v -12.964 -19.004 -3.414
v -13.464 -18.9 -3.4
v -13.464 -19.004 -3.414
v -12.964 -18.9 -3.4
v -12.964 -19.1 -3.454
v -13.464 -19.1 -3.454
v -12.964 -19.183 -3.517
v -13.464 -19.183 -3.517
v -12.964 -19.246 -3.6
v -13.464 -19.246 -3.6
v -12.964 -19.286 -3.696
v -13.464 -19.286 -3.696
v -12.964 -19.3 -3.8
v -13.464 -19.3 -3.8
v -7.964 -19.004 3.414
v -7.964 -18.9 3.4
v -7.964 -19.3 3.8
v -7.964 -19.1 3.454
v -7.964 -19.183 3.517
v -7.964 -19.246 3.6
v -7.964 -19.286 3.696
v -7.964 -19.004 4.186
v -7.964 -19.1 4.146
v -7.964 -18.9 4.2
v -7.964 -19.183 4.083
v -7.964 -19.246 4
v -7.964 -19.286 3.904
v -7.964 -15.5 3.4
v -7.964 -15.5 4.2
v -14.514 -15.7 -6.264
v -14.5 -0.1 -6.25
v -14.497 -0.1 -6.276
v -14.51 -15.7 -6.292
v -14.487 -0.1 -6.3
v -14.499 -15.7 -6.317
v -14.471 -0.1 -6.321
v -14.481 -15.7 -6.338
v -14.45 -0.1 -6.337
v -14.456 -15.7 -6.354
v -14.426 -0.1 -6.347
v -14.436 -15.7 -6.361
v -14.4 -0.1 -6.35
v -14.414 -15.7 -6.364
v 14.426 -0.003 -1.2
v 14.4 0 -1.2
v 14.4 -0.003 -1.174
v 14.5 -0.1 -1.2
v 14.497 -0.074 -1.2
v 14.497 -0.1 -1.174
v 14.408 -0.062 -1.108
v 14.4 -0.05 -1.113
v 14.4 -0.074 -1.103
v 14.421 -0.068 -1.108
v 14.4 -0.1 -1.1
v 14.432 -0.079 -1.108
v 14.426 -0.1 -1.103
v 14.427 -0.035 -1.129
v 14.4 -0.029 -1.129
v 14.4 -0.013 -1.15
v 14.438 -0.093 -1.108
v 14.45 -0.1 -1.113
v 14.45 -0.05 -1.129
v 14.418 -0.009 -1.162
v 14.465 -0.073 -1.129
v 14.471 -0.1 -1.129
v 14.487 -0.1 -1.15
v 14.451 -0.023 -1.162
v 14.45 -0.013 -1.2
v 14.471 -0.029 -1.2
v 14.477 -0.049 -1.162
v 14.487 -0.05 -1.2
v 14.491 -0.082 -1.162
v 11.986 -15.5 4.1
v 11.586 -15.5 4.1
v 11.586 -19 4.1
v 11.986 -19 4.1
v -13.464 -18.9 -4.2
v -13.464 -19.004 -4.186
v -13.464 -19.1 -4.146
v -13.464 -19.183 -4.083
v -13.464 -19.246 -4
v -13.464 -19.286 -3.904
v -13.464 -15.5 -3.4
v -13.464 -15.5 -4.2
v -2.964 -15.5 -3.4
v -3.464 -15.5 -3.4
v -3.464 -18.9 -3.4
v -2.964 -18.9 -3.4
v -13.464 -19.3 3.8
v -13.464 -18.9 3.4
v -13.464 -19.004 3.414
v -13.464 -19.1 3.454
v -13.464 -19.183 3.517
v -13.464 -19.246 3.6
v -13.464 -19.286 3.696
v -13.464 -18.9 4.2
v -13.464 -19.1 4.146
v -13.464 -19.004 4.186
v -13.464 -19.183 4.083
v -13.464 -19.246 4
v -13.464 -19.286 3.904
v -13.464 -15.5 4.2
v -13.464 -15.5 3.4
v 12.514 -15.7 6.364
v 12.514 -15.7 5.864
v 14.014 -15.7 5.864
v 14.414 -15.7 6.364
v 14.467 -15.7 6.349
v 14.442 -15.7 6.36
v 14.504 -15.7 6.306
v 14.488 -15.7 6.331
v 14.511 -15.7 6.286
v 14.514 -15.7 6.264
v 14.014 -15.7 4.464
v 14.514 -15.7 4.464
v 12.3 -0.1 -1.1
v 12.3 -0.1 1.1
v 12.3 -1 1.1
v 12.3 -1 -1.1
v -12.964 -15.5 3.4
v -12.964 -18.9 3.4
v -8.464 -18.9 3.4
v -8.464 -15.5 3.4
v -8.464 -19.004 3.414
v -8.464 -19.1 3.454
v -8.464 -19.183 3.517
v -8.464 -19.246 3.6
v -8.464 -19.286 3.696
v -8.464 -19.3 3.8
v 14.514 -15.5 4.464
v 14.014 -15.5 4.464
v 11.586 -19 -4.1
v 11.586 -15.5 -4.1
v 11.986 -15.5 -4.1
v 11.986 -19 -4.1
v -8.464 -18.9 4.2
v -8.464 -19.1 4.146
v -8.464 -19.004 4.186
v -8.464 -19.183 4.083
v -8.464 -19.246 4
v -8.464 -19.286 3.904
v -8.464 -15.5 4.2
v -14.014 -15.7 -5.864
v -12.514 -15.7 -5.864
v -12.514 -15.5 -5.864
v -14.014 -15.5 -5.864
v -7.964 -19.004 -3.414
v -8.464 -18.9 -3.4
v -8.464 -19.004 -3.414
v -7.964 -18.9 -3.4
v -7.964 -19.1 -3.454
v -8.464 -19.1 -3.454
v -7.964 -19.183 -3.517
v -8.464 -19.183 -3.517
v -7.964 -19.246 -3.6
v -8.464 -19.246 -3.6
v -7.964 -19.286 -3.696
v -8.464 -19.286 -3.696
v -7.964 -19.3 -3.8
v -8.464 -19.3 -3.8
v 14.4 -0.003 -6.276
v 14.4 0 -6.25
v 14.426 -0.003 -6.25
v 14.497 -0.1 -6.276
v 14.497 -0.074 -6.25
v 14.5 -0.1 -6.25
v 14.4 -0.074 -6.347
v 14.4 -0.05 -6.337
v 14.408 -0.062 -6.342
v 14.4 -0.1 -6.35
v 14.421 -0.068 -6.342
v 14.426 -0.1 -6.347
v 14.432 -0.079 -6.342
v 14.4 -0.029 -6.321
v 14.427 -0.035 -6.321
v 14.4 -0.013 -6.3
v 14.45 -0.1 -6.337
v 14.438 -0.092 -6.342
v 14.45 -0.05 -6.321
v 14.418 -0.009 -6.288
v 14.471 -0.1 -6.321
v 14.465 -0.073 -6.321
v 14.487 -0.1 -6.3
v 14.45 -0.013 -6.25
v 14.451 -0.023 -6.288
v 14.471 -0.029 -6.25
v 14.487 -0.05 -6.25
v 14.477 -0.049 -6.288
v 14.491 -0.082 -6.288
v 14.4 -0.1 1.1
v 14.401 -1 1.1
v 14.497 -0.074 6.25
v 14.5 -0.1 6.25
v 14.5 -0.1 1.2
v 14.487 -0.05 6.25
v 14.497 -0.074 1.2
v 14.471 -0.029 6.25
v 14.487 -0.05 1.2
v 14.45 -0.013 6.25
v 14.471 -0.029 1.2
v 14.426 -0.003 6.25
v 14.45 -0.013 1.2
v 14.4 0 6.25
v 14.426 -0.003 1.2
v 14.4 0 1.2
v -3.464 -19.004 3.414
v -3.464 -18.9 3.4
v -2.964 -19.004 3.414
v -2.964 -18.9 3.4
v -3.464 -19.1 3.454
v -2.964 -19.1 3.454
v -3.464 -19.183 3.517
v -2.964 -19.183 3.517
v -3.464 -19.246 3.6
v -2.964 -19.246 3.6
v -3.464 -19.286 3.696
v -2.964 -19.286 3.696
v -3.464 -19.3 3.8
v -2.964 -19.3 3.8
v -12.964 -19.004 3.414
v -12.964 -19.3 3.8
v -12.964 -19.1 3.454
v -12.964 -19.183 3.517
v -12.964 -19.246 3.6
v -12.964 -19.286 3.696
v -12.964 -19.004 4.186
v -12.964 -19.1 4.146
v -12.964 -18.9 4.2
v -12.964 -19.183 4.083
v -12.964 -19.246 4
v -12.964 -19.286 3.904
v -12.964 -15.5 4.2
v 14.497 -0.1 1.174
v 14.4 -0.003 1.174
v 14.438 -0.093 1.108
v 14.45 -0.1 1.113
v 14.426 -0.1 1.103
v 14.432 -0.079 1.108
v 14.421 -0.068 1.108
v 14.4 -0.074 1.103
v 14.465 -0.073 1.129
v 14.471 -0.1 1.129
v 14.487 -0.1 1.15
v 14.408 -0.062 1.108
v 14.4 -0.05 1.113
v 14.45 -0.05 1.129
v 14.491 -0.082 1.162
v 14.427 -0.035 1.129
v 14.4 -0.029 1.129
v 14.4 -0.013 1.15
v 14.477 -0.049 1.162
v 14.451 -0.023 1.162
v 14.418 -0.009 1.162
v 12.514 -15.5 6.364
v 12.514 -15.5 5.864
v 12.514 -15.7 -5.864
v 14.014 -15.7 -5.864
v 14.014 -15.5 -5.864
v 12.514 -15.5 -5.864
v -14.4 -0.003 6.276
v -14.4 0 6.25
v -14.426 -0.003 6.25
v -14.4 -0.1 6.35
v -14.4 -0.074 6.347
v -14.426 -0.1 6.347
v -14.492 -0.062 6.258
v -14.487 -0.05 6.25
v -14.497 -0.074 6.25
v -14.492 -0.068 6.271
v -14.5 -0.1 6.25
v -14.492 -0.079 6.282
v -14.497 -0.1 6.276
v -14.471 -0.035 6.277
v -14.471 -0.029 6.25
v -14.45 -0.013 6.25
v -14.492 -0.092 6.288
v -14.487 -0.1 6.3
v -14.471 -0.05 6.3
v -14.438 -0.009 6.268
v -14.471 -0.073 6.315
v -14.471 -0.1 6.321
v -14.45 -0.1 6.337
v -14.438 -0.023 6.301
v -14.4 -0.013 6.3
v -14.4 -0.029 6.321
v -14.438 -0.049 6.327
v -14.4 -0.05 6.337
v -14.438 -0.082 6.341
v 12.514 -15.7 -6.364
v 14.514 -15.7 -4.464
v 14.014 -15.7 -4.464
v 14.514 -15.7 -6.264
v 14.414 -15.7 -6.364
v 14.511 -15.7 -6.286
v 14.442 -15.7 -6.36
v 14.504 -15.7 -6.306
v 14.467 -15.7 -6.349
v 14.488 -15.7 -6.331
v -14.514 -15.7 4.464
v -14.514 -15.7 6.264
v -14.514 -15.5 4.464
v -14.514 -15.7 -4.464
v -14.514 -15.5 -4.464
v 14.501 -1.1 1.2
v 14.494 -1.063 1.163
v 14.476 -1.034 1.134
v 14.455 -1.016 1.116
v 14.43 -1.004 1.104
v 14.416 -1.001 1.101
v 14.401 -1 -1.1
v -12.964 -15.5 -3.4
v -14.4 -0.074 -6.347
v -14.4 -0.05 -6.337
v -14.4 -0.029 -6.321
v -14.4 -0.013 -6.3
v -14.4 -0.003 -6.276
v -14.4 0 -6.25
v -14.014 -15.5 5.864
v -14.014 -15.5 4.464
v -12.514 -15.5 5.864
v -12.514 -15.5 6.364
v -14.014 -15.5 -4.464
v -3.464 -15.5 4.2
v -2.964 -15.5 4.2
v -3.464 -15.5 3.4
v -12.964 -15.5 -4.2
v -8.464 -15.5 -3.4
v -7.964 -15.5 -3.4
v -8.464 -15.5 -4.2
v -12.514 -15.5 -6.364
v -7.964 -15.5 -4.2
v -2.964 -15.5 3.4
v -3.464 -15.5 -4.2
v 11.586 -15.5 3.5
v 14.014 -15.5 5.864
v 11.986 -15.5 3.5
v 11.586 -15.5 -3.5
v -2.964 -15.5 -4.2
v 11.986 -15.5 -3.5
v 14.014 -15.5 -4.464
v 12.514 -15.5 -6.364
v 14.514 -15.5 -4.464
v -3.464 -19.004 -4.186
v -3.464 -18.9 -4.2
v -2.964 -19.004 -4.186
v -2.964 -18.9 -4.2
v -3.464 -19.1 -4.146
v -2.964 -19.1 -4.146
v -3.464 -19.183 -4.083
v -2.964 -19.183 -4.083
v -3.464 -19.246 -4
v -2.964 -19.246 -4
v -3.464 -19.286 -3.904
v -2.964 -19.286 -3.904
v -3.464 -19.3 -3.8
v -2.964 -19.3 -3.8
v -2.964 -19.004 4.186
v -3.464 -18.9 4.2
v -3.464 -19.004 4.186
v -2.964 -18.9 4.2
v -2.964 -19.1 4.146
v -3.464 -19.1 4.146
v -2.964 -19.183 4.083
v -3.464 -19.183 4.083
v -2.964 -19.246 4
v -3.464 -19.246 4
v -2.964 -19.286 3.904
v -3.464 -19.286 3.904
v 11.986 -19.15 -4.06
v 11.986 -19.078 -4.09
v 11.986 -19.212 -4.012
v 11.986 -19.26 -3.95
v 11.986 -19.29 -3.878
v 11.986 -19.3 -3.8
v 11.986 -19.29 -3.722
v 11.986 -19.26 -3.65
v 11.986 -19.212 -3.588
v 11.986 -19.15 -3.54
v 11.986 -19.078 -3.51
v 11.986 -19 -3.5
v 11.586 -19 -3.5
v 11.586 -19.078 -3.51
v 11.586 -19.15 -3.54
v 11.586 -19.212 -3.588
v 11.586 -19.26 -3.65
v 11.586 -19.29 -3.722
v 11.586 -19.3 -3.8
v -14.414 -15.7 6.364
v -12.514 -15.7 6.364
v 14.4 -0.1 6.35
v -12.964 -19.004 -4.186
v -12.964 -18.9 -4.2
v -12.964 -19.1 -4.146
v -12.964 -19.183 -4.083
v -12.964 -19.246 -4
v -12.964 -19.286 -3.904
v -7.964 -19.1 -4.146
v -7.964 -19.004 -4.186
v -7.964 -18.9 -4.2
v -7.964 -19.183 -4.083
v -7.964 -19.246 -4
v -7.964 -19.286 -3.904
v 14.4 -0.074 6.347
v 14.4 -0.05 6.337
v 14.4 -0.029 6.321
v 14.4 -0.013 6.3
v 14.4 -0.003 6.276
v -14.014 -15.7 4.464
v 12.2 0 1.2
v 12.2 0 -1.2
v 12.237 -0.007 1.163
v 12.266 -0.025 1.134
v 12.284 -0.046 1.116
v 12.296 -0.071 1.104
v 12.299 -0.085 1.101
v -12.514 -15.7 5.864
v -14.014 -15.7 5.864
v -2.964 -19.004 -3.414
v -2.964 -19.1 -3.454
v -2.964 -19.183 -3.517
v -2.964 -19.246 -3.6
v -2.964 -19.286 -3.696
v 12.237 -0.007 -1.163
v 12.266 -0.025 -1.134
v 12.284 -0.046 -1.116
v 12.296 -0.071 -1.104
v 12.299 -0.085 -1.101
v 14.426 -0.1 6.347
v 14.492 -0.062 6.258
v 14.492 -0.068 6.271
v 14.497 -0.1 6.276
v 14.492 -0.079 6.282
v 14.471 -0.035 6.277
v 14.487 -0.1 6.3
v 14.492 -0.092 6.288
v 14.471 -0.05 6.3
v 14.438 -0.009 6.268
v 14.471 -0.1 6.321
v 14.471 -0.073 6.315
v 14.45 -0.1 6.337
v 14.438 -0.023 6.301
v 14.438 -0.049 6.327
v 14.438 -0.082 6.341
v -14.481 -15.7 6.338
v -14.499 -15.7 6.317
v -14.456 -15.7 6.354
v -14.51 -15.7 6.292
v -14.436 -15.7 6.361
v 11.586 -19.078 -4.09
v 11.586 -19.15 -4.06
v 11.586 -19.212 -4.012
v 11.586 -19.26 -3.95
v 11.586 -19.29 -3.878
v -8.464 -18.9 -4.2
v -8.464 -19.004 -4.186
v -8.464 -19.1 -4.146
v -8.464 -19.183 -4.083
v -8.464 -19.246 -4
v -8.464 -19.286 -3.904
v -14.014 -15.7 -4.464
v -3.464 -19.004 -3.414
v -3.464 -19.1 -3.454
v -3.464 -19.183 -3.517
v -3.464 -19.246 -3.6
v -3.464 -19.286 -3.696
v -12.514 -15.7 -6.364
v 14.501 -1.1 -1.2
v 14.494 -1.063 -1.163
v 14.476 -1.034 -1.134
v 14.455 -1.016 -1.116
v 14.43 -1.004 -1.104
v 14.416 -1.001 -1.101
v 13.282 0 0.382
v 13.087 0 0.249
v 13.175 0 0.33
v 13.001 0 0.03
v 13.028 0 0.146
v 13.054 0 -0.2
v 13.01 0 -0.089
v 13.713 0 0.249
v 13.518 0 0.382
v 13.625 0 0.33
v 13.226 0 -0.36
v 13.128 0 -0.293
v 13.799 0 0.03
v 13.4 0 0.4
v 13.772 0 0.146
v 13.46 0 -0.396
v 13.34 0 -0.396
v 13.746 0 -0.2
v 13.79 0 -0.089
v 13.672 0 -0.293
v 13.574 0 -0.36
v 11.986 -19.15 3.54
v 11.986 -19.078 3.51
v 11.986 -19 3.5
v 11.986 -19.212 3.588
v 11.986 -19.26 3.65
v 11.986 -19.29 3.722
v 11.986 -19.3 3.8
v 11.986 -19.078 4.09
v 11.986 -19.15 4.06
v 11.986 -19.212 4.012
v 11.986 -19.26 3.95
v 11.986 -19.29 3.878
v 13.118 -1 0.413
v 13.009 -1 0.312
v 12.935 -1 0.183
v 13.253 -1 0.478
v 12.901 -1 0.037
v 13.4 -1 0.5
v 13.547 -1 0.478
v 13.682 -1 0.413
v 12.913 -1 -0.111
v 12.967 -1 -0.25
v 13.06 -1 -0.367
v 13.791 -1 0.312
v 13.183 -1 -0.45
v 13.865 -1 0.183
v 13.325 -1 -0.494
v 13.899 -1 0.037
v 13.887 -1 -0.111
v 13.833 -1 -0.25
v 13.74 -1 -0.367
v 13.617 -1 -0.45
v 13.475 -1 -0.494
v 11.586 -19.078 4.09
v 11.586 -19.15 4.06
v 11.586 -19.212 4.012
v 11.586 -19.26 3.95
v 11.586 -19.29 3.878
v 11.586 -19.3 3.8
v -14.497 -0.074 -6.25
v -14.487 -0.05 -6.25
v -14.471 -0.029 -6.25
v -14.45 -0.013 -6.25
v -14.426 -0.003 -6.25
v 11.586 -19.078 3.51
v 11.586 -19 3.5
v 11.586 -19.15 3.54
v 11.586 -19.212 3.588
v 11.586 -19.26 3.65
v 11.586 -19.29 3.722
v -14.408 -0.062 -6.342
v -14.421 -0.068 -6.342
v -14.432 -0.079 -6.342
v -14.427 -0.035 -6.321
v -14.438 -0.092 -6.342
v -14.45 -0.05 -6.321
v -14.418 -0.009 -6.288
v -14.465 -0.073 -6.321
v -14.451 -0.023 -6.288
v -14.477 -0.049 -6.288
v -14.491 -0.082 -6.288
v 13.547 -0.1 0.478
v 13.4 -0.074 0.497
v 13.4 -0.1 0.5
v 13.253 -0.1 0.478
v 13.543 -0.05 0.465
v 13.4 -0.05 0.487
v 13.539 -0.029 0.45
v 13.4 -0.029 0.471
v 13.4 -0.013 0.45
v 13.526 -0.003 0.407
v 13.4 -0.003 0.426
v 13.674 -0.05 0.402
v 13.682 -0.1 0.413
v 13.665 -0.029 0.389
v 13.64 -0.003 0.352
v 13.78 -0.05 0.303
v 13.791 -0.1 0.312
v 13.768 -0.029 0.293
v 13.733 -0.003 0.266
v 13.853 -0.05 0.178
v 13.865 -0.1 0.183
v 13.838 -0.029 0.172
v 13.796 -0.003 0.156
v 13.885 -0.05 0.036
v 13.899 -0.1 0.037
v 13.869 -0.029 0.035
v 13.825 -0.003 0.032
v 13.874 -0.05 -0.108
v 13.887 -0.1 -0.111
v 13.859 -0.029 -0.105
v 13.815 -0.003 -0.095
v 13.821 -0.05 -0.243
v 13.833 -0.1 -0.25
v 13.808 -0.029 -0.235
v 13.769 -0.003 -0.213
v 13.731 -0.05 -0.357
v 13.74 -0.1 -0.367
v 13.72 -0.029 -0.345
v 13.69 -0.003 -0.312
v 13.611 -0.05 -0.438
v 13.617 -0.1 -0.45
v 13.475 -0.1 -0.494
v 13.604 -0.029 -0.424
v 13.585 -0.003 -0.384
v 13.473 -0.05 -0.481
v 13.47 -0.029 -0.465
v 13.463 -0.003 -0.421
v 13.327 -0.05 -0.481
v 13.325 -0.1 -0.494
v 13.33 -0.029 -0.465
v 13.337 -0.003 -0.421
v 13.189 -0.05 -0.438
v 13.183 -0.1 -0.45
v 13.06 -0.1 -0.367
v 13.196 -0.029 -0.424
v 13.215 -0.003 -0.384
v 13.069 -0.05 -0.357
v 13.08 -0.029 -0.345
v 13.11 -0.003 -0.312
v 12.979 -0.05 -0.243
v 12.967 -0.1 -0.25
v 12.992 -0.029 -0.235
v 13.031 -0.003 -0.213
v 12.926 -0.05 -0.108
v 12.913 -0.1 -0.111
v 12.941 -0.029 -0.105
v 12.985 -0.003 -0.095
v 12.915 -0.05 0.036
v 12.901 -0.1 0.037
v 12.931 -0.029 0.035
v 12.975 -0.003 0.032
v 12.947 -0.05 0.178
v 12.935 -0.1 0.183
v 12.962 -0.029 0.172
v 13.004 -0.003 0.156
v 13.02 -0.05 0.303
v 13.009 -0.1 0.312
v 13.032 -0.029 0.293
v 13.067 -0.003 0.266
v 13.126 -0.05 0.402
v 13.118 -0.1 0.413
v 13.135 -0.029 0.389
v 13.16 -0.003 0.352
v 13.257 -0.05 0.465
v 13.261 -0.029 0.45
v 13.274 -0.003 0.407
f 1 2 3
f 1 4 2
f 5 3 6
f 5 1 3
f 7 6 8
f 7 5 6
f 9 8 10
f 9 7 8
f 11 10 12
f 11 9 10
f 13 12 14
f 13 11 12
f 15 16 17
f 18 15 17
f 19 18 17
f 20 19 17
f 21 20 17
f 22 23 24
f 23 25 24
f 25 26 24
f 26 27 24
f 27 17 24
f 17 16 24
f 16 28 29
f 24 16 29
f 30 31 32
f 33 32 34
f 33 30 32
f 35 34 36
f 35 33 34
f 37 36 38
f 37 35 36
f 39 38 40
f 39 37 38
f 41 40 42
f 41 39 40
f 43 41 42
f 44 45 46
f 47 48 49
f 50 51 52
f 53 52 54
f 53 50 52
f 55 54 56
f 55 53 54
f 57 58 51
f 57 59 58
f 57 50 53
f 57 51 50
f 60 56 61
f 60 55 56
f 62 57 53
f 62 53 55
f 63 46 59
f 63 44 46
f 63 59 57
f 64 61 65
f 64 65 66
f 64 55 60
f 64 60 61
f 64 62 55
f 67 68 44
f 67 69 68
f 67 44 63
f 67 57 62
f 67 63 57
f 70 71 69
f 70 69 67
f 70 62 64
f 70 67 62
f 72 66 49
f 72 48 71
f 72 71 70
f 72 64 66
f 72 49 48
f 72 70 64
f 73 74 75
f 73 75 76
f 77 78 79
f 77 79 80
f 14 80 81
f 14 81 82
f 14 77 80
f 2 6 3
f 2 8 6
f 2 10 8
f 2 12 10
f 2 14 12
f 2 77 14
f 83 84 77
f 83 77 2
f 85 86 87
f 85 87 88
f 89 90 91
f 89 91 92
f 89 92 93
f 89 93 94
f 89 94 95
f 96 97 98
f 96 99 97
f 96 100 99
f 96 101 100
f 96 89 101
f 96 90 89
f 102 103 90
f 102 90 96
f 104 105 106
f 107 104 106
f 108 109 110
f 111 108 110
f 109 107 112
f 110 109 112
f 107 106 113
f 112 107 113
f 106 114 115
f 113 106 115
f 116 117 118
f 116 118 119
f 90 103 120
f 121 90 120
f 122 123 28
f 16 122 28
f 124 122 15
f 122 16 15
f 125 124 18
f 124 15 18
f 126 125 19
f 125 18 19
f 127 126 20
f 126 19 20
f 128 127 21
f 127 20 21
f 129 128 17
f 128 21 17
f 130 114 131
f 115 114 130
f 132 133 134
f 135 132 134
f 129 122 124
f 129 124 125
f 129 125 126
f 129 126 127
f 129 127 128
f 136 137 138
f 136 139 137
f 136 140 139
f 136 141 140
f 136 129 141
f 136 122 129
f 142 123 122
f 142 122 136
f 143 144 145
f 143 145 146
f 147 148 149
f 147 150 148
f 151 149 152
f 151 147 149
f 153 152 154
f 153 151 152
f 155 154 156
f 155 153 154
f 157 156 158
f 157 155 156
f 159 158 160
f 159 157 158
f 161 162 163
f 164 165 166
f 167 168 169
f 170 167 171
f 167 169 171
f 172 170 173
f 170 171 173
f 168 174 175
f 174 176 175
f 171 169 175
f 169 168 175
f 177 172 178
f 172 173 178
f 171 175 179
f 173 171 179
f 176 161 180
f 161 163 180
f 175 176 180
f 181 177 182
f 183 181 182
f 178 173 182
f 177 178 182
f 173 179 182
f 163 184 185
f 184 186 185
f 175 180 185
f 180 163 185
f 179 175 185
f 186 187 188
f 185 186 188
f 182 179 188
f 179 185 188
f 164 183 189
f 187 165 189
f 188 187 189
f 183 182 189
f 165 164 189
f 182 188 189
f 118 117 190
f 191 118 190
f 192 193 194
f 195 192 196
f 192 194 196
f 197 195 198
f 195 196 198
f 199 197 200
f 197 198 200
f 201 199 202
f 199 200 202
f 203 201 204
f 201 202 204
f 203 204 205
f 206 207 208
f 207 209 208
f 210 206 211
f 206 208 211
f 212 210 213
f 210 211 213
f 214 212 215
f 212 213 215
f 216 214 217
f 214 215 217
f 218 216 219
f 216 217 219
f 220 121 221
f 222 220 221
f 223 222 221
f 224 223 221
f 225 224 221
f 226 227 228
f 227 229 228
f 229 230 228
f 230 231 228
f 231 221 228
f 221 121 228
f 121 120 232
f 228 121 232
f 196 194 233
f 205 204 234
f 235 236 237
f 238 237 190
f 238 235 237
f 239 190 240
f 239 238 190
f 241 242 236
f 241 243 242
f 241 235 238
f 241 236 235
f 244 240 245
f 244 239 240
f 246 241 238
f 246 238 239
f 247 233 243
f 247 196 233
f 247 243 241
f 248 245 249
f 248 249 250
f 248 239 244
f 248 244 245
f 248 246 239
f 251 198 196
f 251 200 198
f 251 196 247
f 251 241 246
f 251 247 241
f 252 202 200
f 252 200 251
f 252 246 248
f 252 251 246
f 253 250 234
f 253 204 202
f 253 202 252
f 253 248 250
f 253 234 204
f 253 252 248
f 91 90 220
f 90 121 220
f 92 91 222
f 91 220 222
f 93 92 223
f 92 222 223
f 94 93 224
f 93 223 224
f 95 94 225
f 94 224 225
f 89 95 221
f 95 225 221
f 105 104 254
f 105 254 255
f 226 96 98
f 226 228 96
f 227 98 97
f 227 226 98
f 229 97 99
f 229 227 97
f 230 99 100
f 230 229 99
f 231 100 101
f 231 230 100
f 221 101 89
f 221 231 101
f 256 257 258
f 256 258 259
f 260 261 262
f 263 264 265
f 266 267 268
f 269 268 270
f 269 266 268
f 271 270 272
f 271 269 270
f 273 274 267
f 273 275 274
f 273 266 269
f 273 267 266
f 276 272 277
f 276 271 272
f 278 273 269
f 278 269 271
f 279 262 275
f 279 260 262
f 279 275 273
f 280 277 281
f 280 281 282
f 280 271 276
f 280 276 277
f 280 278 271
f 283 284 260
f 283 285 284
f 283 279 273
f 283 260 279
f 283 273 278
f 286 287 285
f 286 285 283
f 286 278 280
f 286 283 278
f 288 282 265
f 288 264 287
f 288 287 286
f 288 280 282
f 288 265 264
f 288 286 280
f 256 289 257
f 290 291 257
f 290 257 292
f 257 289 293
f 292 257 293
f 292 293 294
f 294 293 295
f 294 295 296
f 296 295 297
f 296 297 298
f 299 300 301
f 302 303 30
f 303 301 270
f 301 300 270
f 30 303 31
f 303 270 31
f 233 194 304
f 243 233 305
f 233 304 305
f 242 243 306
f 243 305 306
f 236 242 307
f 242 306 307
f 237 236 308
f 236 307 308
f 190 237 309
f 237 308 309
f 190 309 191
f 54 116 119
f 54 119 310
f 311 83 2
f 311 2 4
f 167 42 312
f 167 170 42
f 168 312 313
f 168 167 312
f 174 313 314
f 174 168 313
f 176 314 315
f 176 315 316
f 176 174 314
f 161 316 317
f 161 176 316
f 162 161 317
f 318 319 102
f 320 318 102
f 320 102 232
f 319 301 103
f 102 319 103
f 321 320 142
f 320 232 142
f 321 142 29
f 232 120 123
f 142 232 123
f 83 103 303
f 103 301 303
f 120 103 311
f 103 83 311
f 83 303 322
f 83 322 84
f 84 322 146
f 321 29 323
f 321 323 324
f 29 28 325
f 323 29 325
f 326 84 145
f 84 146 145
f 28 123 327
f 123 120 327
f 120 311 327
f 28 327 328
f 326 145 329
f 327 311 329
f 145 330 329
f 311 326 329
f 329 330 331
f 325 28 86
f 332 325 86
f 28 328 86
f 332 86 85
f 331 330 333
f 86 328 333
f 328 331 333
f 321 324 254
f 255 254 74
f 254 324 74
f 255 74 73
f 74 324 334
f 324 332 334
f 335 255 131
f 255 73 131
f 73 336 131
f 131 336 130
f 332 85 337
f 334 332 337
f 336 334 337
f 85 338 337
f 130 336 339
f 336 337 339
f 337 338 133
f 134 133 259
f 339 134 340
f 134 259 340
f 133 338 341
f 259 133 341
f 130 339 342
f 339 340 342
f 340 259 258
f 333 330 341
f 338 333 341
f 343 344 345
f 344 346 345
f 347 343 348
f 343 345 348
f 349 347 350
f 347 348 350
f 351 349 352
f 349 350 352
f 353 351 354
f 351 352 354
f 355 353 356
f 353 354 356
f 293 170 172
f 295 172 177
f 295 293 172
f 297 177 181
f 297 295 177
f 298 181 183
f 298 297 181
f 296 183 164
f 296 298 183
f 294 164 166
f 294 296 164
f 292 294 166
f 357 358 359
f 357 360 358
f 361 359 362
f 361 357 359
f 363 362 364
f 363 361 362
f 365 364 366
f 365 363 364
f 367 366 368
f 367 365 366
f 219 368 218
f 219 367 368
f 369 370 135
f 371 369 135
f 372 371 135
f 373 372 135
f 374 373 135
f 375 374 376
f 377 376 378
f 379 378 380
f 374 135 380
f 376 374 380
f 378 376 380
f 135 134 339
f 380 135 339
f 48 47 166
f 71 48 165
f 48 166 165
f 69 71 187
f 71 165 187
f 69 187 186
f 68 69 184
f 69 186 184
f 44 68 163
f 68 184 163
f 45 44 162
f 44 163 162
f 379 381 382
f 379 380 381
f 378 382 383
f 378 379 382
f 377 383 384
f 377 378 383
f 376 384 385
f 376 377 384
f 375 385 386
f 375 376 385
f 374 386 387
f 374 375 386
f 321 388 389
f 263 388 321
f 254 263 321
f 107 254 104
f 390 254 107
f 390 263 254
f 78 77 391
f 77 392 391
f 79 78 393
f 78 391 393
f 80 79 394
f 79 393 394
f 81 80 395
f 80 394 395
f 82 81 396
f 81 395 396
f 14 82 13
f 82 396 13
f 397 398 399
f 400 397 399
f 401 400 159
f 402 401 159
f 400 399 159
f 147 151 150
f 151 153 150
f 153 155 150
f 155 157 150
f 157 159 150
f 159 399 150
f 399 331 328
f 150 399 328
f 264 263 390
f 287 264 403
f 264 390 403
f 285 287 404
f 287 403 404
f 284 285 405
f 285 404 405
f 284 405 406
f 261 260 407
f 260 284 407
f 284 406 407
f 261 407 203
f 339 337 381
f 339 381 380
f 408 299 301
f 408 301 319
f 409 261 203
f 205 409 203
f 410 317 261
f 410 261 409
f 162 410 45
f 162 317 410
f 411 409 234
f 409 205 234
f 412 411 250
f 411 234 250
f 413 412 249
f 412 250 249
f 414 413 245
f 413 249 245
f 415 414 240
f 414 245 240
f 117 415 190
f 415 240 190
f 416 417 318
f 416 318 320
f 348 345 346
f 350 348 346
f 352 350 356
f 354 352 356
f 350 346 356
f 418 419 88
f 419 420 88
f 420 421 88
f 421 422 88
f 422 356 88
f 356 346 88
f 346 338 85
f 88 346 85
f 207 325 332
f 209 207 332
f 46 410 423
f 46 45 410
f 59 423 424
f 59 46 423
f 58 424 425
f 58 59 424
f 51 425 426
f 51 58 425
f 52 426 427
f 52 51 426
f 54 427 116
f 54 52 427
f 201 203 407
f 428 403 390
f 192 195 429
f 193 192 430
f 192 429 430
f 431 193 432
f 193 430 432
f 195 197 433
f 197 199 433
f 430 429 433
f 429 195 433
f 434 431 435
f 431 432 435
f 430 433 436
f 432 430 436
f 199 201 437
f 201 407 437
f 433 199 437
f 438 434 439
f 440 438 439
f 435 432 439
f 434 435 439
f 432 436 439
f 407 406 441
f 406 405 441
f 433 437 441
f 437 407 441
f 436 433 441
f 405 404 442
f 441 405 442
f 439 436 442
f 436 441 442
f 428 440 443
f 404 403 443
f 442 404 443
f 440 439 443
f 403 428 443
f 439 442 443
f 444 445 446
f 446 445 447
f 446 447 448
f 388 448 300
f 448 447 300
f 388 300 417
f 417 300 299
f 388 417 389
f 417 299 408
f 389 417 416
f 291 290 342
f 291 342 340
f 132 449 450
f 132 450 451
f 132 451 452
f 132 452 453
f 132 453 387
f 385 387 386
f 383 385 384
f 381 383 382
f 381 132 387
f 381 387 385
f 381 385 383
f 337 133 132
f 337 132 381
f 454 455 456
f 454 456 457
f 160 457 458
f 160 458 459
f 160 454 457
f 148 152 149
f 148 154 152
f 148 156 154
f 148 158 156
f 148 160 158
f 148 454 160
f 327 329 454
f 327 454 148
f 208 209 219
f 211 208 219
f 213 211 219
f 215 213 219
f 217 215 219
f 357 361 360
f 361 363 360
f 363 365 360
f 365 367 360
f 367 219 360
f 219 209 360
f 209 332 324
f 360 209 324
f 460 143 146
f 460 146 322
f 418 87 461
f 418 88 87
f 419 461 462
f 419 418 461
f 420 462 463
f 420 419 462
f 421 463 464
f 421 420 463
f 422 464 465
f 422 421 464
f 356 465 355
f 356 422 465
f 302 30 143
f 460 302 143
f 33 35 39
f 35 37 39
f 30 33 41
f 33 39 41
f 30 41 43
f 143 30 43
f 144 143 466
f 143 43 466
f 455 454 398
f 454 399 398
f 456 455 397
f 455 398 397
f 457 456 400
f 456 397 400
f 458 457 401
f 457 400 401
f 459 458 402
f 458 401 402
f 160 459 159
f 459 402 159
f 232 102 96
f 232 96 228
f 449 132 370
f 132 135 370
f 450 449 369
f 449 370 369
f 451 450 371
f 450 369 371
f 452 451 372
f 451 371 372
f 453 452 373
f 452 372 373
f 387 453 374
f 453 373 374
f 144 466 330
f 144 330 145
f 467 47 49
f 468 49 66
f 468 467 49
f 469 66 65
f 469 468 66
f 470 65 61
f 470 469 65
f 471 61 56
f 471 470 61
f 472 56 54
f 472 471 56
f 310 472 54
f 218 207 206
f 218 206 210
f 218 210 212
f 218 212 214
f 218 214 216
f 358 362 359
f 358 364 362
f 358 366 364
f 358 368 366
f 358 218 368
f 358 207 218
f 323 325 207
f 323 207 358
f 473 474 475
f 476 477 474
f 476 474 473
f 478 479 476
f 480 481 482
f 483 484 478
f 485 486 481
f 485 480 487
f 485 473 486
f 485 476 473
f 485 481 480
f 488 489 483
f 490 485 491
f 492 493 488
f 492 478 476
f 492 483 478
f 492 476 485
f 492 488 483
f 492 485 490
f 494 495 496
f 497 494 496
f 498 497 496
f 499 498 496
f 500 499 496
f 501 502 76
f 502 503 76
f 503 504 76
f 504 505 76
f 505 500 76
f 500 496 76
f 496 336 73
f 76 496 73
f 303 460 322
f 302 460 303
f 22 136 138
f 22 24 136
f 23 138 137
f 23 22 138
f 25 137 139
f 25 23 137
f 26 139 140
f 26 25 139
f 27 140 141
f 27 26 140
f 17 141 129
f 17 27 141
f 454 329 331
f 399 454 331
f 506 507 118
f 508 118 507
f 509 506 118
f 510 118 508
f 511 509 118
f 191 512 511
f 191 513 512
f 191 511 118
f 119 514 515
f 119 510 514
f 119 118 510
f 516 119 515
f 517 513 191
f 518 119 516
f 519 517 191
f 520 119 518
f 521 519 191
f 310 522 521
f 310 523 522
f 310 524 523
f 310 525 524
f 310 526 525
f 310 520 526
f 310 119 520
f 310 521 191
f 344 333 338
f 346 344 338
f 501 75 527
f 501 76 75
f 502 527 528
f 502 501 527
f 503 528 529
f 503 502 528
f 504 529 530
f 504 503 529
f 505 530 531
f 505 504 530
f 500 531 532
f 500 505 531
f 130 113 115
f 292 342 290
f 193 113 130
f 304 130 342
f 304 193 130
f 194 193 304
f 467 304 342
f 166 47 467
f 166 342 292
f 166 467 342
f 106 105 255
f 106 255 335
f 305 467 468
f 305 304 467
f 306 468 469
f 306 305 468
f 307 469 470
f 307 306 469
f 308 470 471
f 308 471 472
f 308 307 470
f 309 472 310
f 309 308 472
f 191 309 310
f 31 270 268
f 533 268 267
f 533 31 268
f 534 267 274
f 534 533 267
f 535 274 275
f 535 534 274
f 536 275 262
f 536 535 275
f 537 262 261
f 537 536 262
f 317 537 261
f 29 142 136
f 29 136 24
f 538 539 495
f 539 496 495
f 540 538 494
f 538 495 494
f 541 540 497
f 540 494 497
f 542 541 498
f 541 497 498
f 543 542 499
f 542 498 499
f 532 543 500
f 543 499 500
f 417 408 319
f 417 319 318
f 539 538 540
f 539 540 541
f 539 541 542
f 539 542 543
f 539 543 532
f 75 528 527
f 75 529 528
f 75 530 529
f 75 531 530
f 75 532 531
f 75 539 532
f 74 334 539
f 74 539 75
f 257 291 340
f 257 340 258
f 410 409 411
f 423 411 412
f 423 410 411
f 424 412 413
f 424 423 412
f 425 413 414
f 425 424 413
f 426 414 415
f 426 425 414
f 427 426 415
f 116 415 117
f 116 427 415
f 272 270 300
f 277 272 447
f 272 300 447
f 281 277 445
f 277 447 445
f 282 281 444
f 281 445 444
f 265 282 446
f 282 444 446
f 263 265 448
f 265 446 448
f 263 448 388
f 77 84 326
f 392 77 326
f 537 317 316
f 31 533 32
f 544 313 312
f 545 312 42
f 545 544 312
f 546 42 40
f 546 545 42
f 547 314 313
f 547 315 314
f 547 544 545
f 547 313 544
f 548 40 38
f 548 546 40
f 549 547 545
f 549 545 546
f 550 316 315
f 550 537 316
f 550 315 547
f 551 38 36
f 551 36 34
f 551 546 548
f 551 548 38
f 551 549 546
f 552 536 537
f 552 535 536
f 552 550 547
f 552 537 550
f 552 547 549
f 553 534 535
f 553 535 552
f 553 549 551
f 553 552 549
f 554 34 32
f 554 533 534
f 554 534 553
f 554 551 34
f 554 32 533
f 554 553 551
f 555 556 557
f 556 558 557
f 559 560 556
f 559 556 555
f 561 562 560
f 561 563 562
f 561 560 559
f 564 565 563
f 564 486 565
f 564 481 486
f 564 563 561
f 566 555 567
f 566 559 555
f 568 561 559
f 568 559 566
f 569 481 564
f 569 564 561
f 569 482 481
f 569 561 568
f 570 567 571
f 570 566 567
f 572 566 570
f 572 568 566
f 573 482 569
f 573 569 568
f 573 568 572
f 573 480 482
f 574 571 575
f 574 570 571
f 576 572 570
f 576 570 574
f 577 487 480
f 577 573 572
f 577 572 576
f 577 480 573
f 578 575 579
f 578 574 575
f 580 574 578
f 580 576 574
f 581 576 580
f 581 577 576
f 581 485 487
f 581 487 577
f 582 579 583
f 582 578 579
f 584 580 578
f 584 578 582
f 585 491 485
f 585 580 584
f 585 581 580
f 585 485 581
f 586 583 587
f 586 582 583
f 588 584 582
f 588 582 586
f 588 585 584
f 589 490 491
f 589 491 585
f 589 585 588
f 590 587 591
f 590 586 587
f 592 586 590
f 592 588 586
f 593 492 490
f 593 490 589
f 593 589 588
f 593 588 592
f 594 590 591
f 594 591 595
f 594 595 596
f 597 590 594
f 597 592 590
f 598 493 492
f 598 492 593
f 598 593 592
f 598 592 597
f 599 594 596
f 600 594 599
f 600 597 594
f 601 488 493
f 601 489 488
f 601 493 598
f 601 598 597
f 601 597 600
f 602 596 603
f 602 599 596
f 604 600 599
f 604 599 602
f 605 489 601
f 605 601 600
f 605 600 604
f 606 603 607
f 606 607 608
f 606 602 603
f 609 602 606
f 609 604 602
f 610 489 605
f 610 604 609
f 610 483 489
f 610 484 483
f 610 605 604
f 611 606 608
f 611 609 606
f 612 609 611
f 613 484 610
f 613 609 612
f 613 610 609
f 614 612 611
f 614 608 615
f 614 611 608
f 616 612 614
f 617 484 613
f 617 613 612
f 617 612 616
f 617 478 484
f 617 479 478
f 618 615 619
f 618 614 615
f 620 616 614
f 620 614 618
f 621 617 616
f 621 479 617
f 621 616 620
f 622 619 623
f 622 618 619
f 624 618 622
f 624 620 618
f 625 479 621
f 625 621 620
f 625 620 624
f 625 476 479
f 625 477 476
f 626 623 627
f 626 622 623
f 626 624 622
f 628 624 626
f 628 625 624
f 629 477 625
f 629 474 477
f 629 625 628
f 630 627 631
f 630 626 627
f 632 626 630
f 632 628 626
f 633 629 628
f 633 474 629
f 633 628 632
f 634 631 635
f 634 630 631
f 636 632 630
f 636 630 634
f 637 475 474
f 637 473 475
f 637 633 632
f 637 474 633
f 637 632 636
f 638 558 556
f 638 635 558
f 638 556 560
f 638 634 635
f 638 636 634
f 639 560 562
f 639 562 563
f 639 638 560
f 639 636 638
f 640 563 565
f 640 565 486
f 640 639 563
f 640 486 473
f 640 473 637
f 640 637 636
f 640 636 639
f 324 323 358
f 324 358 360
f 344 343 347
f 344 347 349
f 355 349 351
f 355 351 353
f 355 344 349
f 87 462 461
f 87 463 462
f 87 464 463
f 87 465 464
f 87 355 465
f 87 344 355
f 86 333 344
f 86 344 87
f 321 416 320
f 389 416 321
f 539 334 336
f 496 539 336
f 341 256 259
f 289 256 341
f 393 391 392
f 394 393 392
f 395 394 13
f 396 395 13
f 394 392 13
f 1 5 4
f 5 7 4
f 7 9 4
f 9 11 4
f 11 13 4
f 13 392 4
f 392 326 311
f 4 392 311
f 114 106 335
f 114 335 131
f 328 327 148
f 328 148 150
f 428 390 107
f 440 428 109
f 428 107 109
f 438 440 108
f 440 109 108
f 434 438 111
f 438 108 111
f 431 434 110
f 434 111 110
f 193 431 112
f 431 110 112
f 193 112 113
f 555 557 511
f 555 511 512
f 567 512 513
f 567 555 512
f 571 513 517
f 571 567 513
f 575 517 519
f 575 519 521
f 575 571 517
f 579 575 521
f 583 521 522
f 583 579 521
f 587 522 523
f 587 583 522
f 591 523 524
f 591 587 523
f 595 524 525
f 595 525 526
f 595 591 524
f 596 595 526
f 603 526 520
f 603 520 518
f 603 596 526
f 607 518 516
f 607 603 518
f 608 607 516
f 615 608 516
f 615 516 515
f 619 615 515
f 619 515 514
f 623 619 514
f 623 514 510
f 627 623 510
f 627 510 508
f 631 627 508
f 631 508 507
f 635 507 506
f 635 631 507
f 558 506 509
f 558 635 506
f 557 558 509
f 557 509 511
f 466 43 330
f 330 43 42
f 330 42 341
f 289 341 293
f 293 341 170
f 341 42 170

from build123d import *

# Parameters (mm, degrees)
SKETCH1_W           = 29
SKETCH1_H           = 12.7
BOSS_EXTRUDE1_DEPTH = 15.7
BOSS_EXTRUDE1_DRAFT = 0.05
CUT_EXTRUDE1_DEPTH  = 0.2
SKETCH3_W           = 0.4
SKETCH3_H           = 0.6
SKETCH3_W_2         = 0.5
SKETCH3_H_2         = 0.8
BOSS_EXTRUDE2_DEPTH = 3.8
FILLET1_R           = 0.3
FILLET2_R           = 0.4
SKETCH4_W           = 3.182056495
SKETCH4_H           = 2.2
SKETCH4_R           = 0.5
CUT_EXTRUDE2_DEPTH  = 1
FILLET3_R           = 0.1


with BuildPart() as part:
    # Sketch1 → Boss-Extrude1 (with draft: the straight prism first)
    with BuildSketch(Plane(origin=(0, 0, 0), x_dir=(1, 0, 0), z_dir=(0, 1, 0))):
        Rectangle(SKETCH1_W, SKETCH1_H)
    extrude(amount=-BOSS_EXTRUDE1_DEPTH)
    # Boss-Extrude1: the draft: its side faces are tilted about the plane it starts from
    boss_extrude1_sides = [part.faces().sort_by_distance(p)[0] for p in [
        (-14.5, -7.85, 0),
        (0, -7.85, 6.35),
        (14.5, -7.85, 0),
        (0, -7.85, -6.35),
    ]]
    draft(boss_extrude1_sides, Plane(origin=(0, 0, 0), x_dir=(1, 0, 0), z_dir=(0, 1, 0)), BOSS_EXTRUDE1_DRAFT)

    # Sketch2 → Cut-Extrude1 (cut)
    with BuildSketch(Plane(origin=(0, -15.7, 0), x_dir=(-1, 0, 0), z_dir=(0, -1, 0))):
        Polygon((14.013700838, -5.863700838), (12.513700838, -5.863700838), (12.513700838, -6.363700838), (-12.513700838, -6.363700838), (-12.513700838, -5.863700838), (-14.013700838, -5.863700838), (-14.013700838, -4.463700838), (-14.513700838, -4.463700838), (-14.513700838, 4.463700838), (-14.013700838, 4.463700838), (-14.013700838, 5.863700838), (-12.513700838, 5.863700838), (-12.513700838, 6.363700838), (12.513700838, 6.363700838), (12.513700838, 5.863700838), (14.013700838, 5.863700838), (14.013700838, 4.463700838), (14.513700838, 4.463700838), (14.513700838, -4.463700838), (14.013700838, -4.463700838), align=None)
    extrude(amount=-CUT_EXTRUDE1_DEPTH, mode=Mode.SUBTRACT)

    # Sketch3 → Boss-Extrude2 (add)
    with BuildSketch(Plane.XZ.offset(15.5)):
        with Locations((11.786299162, -3.8)):
            Rectangle(SKETCH3_W, SKETCH3_H)
        with Locations((11.786299162, 3.8)):
            Rectangle(SKETCH3_W, SKETCH3_H)
        with Locations((-8.213700838, 3.8)):
            Rectangle(SKETCH3_W_2, SKETCH3_H_2)
        with Locations((-13.213700838, -3.8)):
            Rectangle(SKETCH3_W_2, SKETCH3_H_2)
        with Locations((-13.213700838, 3.8)):
            Rectangle(SKETCH3_W_2, SKETCH3_H_2)
        with Locations((-8.213700838, -3.8)):
            Rectangle(SKETCH3_W_2, SKETCH3_H_2)
        with Locations((-3.213700838, 3.8)):
            Rectangle(SKETCH3_W_2, SKETCH3_H_2)
        with Locations((-3.213700838, -3.8)):
            Rectangle(SKETCH3_W_2, SKETCH3_H_2)
    extrude(amount=BOSS_EXTRUDE2_DEPTH)

    # Fillet1
    fillet1_edges = [part.edges().sort_by_distance(p)[0] for p in [
        (11.786299162, -19.3, 4.1),
        (11.786299162, -19.3, 3.5),
        (11.786299162, -19.3, -3.5),
        (11.786299162, -19.3, -4.1),
    ]]
    fillet(fillet1_edges, radius=FILLET1_R - 0.0001)  # a hair under: the kernel refuses the full size

    # Fillet2
    fillet2_edges = [part.edges().sort_by_distance(p)[0] for p in [
        (-13.213700838, -19.3, -4.2),
        (-13.213700838, -19.3, -3.4),
        (-8.213700838, -19.3, 4.2),
        (-8.213700838, -19.3, 3.4),
        (-13.213700838, -19.3, 3.4),
        (-13.213700838, -19.3, 4.2),
        (-8.213700838, -19.3, -4.2),
        (-8.213700838, -19.3, -3.4),
        (-3.213700838, -19.3, -4.2),
        (-3.213700838, -19.3, -3.4),
        (-3.213700838, -19.3, 3.4),
        (-3.213700838, -19.3, 4.2),
    ]]
    fillet(fillet2_edges, radius=FILLET2_R - 0.0001)  # a hair under: the kernel refuses the full size

    # Sketch4 → Cut-Extrude2 (cut)
    with BuildSketch(Plane(origin=(0, 0, 0), x_dir=(1, 0, 0), z_dir=(0, 1, 0))):
        with Locations((13.891028247, 0)):
            Rectangle(SKETCH4_W, SKETCH4_H)
        with Locations(Location((13.4, 0, 0), (0, 0, 270))):
            Circle(SKETCH4_R, mode=Mode.SUBTRACT)
    extrude(amount=-CUT_EXTRUDE2_DEPTH, mode=Mode.SUBTRACT)

    # Fillet3
    fillet3_edges = [part.edges().sort_by_distance(p)[0] for p in [
        (14.5, 0, -3.725),
        (13.4, 0, -1.1),
        (14.500872665, -1, 0),
        (14.500436332, -0.5, -1.1),
        (14.500436332, -0.5, 1.1),
        (13.4, 0, 1.1),
        (12.3, 0, 0),
        (13.4, 0, -0.5),
        (0, 0, 6.35),
        (-14.5, 0, 0),
        (0, 0, -6.35),
        (14.5, 0, 3.725),
        (14.506850419, -7.85, 6.356850419),
        (-14.506850419, -7.85, 6.356850419),
        (-14.506850419, -7.85, -6.356850419),
        (14.506850419, -7.85, -6.356850419),
    ]]
    fillet(fillet3_edges, radius=FILLET3_R)


solid = part.part
